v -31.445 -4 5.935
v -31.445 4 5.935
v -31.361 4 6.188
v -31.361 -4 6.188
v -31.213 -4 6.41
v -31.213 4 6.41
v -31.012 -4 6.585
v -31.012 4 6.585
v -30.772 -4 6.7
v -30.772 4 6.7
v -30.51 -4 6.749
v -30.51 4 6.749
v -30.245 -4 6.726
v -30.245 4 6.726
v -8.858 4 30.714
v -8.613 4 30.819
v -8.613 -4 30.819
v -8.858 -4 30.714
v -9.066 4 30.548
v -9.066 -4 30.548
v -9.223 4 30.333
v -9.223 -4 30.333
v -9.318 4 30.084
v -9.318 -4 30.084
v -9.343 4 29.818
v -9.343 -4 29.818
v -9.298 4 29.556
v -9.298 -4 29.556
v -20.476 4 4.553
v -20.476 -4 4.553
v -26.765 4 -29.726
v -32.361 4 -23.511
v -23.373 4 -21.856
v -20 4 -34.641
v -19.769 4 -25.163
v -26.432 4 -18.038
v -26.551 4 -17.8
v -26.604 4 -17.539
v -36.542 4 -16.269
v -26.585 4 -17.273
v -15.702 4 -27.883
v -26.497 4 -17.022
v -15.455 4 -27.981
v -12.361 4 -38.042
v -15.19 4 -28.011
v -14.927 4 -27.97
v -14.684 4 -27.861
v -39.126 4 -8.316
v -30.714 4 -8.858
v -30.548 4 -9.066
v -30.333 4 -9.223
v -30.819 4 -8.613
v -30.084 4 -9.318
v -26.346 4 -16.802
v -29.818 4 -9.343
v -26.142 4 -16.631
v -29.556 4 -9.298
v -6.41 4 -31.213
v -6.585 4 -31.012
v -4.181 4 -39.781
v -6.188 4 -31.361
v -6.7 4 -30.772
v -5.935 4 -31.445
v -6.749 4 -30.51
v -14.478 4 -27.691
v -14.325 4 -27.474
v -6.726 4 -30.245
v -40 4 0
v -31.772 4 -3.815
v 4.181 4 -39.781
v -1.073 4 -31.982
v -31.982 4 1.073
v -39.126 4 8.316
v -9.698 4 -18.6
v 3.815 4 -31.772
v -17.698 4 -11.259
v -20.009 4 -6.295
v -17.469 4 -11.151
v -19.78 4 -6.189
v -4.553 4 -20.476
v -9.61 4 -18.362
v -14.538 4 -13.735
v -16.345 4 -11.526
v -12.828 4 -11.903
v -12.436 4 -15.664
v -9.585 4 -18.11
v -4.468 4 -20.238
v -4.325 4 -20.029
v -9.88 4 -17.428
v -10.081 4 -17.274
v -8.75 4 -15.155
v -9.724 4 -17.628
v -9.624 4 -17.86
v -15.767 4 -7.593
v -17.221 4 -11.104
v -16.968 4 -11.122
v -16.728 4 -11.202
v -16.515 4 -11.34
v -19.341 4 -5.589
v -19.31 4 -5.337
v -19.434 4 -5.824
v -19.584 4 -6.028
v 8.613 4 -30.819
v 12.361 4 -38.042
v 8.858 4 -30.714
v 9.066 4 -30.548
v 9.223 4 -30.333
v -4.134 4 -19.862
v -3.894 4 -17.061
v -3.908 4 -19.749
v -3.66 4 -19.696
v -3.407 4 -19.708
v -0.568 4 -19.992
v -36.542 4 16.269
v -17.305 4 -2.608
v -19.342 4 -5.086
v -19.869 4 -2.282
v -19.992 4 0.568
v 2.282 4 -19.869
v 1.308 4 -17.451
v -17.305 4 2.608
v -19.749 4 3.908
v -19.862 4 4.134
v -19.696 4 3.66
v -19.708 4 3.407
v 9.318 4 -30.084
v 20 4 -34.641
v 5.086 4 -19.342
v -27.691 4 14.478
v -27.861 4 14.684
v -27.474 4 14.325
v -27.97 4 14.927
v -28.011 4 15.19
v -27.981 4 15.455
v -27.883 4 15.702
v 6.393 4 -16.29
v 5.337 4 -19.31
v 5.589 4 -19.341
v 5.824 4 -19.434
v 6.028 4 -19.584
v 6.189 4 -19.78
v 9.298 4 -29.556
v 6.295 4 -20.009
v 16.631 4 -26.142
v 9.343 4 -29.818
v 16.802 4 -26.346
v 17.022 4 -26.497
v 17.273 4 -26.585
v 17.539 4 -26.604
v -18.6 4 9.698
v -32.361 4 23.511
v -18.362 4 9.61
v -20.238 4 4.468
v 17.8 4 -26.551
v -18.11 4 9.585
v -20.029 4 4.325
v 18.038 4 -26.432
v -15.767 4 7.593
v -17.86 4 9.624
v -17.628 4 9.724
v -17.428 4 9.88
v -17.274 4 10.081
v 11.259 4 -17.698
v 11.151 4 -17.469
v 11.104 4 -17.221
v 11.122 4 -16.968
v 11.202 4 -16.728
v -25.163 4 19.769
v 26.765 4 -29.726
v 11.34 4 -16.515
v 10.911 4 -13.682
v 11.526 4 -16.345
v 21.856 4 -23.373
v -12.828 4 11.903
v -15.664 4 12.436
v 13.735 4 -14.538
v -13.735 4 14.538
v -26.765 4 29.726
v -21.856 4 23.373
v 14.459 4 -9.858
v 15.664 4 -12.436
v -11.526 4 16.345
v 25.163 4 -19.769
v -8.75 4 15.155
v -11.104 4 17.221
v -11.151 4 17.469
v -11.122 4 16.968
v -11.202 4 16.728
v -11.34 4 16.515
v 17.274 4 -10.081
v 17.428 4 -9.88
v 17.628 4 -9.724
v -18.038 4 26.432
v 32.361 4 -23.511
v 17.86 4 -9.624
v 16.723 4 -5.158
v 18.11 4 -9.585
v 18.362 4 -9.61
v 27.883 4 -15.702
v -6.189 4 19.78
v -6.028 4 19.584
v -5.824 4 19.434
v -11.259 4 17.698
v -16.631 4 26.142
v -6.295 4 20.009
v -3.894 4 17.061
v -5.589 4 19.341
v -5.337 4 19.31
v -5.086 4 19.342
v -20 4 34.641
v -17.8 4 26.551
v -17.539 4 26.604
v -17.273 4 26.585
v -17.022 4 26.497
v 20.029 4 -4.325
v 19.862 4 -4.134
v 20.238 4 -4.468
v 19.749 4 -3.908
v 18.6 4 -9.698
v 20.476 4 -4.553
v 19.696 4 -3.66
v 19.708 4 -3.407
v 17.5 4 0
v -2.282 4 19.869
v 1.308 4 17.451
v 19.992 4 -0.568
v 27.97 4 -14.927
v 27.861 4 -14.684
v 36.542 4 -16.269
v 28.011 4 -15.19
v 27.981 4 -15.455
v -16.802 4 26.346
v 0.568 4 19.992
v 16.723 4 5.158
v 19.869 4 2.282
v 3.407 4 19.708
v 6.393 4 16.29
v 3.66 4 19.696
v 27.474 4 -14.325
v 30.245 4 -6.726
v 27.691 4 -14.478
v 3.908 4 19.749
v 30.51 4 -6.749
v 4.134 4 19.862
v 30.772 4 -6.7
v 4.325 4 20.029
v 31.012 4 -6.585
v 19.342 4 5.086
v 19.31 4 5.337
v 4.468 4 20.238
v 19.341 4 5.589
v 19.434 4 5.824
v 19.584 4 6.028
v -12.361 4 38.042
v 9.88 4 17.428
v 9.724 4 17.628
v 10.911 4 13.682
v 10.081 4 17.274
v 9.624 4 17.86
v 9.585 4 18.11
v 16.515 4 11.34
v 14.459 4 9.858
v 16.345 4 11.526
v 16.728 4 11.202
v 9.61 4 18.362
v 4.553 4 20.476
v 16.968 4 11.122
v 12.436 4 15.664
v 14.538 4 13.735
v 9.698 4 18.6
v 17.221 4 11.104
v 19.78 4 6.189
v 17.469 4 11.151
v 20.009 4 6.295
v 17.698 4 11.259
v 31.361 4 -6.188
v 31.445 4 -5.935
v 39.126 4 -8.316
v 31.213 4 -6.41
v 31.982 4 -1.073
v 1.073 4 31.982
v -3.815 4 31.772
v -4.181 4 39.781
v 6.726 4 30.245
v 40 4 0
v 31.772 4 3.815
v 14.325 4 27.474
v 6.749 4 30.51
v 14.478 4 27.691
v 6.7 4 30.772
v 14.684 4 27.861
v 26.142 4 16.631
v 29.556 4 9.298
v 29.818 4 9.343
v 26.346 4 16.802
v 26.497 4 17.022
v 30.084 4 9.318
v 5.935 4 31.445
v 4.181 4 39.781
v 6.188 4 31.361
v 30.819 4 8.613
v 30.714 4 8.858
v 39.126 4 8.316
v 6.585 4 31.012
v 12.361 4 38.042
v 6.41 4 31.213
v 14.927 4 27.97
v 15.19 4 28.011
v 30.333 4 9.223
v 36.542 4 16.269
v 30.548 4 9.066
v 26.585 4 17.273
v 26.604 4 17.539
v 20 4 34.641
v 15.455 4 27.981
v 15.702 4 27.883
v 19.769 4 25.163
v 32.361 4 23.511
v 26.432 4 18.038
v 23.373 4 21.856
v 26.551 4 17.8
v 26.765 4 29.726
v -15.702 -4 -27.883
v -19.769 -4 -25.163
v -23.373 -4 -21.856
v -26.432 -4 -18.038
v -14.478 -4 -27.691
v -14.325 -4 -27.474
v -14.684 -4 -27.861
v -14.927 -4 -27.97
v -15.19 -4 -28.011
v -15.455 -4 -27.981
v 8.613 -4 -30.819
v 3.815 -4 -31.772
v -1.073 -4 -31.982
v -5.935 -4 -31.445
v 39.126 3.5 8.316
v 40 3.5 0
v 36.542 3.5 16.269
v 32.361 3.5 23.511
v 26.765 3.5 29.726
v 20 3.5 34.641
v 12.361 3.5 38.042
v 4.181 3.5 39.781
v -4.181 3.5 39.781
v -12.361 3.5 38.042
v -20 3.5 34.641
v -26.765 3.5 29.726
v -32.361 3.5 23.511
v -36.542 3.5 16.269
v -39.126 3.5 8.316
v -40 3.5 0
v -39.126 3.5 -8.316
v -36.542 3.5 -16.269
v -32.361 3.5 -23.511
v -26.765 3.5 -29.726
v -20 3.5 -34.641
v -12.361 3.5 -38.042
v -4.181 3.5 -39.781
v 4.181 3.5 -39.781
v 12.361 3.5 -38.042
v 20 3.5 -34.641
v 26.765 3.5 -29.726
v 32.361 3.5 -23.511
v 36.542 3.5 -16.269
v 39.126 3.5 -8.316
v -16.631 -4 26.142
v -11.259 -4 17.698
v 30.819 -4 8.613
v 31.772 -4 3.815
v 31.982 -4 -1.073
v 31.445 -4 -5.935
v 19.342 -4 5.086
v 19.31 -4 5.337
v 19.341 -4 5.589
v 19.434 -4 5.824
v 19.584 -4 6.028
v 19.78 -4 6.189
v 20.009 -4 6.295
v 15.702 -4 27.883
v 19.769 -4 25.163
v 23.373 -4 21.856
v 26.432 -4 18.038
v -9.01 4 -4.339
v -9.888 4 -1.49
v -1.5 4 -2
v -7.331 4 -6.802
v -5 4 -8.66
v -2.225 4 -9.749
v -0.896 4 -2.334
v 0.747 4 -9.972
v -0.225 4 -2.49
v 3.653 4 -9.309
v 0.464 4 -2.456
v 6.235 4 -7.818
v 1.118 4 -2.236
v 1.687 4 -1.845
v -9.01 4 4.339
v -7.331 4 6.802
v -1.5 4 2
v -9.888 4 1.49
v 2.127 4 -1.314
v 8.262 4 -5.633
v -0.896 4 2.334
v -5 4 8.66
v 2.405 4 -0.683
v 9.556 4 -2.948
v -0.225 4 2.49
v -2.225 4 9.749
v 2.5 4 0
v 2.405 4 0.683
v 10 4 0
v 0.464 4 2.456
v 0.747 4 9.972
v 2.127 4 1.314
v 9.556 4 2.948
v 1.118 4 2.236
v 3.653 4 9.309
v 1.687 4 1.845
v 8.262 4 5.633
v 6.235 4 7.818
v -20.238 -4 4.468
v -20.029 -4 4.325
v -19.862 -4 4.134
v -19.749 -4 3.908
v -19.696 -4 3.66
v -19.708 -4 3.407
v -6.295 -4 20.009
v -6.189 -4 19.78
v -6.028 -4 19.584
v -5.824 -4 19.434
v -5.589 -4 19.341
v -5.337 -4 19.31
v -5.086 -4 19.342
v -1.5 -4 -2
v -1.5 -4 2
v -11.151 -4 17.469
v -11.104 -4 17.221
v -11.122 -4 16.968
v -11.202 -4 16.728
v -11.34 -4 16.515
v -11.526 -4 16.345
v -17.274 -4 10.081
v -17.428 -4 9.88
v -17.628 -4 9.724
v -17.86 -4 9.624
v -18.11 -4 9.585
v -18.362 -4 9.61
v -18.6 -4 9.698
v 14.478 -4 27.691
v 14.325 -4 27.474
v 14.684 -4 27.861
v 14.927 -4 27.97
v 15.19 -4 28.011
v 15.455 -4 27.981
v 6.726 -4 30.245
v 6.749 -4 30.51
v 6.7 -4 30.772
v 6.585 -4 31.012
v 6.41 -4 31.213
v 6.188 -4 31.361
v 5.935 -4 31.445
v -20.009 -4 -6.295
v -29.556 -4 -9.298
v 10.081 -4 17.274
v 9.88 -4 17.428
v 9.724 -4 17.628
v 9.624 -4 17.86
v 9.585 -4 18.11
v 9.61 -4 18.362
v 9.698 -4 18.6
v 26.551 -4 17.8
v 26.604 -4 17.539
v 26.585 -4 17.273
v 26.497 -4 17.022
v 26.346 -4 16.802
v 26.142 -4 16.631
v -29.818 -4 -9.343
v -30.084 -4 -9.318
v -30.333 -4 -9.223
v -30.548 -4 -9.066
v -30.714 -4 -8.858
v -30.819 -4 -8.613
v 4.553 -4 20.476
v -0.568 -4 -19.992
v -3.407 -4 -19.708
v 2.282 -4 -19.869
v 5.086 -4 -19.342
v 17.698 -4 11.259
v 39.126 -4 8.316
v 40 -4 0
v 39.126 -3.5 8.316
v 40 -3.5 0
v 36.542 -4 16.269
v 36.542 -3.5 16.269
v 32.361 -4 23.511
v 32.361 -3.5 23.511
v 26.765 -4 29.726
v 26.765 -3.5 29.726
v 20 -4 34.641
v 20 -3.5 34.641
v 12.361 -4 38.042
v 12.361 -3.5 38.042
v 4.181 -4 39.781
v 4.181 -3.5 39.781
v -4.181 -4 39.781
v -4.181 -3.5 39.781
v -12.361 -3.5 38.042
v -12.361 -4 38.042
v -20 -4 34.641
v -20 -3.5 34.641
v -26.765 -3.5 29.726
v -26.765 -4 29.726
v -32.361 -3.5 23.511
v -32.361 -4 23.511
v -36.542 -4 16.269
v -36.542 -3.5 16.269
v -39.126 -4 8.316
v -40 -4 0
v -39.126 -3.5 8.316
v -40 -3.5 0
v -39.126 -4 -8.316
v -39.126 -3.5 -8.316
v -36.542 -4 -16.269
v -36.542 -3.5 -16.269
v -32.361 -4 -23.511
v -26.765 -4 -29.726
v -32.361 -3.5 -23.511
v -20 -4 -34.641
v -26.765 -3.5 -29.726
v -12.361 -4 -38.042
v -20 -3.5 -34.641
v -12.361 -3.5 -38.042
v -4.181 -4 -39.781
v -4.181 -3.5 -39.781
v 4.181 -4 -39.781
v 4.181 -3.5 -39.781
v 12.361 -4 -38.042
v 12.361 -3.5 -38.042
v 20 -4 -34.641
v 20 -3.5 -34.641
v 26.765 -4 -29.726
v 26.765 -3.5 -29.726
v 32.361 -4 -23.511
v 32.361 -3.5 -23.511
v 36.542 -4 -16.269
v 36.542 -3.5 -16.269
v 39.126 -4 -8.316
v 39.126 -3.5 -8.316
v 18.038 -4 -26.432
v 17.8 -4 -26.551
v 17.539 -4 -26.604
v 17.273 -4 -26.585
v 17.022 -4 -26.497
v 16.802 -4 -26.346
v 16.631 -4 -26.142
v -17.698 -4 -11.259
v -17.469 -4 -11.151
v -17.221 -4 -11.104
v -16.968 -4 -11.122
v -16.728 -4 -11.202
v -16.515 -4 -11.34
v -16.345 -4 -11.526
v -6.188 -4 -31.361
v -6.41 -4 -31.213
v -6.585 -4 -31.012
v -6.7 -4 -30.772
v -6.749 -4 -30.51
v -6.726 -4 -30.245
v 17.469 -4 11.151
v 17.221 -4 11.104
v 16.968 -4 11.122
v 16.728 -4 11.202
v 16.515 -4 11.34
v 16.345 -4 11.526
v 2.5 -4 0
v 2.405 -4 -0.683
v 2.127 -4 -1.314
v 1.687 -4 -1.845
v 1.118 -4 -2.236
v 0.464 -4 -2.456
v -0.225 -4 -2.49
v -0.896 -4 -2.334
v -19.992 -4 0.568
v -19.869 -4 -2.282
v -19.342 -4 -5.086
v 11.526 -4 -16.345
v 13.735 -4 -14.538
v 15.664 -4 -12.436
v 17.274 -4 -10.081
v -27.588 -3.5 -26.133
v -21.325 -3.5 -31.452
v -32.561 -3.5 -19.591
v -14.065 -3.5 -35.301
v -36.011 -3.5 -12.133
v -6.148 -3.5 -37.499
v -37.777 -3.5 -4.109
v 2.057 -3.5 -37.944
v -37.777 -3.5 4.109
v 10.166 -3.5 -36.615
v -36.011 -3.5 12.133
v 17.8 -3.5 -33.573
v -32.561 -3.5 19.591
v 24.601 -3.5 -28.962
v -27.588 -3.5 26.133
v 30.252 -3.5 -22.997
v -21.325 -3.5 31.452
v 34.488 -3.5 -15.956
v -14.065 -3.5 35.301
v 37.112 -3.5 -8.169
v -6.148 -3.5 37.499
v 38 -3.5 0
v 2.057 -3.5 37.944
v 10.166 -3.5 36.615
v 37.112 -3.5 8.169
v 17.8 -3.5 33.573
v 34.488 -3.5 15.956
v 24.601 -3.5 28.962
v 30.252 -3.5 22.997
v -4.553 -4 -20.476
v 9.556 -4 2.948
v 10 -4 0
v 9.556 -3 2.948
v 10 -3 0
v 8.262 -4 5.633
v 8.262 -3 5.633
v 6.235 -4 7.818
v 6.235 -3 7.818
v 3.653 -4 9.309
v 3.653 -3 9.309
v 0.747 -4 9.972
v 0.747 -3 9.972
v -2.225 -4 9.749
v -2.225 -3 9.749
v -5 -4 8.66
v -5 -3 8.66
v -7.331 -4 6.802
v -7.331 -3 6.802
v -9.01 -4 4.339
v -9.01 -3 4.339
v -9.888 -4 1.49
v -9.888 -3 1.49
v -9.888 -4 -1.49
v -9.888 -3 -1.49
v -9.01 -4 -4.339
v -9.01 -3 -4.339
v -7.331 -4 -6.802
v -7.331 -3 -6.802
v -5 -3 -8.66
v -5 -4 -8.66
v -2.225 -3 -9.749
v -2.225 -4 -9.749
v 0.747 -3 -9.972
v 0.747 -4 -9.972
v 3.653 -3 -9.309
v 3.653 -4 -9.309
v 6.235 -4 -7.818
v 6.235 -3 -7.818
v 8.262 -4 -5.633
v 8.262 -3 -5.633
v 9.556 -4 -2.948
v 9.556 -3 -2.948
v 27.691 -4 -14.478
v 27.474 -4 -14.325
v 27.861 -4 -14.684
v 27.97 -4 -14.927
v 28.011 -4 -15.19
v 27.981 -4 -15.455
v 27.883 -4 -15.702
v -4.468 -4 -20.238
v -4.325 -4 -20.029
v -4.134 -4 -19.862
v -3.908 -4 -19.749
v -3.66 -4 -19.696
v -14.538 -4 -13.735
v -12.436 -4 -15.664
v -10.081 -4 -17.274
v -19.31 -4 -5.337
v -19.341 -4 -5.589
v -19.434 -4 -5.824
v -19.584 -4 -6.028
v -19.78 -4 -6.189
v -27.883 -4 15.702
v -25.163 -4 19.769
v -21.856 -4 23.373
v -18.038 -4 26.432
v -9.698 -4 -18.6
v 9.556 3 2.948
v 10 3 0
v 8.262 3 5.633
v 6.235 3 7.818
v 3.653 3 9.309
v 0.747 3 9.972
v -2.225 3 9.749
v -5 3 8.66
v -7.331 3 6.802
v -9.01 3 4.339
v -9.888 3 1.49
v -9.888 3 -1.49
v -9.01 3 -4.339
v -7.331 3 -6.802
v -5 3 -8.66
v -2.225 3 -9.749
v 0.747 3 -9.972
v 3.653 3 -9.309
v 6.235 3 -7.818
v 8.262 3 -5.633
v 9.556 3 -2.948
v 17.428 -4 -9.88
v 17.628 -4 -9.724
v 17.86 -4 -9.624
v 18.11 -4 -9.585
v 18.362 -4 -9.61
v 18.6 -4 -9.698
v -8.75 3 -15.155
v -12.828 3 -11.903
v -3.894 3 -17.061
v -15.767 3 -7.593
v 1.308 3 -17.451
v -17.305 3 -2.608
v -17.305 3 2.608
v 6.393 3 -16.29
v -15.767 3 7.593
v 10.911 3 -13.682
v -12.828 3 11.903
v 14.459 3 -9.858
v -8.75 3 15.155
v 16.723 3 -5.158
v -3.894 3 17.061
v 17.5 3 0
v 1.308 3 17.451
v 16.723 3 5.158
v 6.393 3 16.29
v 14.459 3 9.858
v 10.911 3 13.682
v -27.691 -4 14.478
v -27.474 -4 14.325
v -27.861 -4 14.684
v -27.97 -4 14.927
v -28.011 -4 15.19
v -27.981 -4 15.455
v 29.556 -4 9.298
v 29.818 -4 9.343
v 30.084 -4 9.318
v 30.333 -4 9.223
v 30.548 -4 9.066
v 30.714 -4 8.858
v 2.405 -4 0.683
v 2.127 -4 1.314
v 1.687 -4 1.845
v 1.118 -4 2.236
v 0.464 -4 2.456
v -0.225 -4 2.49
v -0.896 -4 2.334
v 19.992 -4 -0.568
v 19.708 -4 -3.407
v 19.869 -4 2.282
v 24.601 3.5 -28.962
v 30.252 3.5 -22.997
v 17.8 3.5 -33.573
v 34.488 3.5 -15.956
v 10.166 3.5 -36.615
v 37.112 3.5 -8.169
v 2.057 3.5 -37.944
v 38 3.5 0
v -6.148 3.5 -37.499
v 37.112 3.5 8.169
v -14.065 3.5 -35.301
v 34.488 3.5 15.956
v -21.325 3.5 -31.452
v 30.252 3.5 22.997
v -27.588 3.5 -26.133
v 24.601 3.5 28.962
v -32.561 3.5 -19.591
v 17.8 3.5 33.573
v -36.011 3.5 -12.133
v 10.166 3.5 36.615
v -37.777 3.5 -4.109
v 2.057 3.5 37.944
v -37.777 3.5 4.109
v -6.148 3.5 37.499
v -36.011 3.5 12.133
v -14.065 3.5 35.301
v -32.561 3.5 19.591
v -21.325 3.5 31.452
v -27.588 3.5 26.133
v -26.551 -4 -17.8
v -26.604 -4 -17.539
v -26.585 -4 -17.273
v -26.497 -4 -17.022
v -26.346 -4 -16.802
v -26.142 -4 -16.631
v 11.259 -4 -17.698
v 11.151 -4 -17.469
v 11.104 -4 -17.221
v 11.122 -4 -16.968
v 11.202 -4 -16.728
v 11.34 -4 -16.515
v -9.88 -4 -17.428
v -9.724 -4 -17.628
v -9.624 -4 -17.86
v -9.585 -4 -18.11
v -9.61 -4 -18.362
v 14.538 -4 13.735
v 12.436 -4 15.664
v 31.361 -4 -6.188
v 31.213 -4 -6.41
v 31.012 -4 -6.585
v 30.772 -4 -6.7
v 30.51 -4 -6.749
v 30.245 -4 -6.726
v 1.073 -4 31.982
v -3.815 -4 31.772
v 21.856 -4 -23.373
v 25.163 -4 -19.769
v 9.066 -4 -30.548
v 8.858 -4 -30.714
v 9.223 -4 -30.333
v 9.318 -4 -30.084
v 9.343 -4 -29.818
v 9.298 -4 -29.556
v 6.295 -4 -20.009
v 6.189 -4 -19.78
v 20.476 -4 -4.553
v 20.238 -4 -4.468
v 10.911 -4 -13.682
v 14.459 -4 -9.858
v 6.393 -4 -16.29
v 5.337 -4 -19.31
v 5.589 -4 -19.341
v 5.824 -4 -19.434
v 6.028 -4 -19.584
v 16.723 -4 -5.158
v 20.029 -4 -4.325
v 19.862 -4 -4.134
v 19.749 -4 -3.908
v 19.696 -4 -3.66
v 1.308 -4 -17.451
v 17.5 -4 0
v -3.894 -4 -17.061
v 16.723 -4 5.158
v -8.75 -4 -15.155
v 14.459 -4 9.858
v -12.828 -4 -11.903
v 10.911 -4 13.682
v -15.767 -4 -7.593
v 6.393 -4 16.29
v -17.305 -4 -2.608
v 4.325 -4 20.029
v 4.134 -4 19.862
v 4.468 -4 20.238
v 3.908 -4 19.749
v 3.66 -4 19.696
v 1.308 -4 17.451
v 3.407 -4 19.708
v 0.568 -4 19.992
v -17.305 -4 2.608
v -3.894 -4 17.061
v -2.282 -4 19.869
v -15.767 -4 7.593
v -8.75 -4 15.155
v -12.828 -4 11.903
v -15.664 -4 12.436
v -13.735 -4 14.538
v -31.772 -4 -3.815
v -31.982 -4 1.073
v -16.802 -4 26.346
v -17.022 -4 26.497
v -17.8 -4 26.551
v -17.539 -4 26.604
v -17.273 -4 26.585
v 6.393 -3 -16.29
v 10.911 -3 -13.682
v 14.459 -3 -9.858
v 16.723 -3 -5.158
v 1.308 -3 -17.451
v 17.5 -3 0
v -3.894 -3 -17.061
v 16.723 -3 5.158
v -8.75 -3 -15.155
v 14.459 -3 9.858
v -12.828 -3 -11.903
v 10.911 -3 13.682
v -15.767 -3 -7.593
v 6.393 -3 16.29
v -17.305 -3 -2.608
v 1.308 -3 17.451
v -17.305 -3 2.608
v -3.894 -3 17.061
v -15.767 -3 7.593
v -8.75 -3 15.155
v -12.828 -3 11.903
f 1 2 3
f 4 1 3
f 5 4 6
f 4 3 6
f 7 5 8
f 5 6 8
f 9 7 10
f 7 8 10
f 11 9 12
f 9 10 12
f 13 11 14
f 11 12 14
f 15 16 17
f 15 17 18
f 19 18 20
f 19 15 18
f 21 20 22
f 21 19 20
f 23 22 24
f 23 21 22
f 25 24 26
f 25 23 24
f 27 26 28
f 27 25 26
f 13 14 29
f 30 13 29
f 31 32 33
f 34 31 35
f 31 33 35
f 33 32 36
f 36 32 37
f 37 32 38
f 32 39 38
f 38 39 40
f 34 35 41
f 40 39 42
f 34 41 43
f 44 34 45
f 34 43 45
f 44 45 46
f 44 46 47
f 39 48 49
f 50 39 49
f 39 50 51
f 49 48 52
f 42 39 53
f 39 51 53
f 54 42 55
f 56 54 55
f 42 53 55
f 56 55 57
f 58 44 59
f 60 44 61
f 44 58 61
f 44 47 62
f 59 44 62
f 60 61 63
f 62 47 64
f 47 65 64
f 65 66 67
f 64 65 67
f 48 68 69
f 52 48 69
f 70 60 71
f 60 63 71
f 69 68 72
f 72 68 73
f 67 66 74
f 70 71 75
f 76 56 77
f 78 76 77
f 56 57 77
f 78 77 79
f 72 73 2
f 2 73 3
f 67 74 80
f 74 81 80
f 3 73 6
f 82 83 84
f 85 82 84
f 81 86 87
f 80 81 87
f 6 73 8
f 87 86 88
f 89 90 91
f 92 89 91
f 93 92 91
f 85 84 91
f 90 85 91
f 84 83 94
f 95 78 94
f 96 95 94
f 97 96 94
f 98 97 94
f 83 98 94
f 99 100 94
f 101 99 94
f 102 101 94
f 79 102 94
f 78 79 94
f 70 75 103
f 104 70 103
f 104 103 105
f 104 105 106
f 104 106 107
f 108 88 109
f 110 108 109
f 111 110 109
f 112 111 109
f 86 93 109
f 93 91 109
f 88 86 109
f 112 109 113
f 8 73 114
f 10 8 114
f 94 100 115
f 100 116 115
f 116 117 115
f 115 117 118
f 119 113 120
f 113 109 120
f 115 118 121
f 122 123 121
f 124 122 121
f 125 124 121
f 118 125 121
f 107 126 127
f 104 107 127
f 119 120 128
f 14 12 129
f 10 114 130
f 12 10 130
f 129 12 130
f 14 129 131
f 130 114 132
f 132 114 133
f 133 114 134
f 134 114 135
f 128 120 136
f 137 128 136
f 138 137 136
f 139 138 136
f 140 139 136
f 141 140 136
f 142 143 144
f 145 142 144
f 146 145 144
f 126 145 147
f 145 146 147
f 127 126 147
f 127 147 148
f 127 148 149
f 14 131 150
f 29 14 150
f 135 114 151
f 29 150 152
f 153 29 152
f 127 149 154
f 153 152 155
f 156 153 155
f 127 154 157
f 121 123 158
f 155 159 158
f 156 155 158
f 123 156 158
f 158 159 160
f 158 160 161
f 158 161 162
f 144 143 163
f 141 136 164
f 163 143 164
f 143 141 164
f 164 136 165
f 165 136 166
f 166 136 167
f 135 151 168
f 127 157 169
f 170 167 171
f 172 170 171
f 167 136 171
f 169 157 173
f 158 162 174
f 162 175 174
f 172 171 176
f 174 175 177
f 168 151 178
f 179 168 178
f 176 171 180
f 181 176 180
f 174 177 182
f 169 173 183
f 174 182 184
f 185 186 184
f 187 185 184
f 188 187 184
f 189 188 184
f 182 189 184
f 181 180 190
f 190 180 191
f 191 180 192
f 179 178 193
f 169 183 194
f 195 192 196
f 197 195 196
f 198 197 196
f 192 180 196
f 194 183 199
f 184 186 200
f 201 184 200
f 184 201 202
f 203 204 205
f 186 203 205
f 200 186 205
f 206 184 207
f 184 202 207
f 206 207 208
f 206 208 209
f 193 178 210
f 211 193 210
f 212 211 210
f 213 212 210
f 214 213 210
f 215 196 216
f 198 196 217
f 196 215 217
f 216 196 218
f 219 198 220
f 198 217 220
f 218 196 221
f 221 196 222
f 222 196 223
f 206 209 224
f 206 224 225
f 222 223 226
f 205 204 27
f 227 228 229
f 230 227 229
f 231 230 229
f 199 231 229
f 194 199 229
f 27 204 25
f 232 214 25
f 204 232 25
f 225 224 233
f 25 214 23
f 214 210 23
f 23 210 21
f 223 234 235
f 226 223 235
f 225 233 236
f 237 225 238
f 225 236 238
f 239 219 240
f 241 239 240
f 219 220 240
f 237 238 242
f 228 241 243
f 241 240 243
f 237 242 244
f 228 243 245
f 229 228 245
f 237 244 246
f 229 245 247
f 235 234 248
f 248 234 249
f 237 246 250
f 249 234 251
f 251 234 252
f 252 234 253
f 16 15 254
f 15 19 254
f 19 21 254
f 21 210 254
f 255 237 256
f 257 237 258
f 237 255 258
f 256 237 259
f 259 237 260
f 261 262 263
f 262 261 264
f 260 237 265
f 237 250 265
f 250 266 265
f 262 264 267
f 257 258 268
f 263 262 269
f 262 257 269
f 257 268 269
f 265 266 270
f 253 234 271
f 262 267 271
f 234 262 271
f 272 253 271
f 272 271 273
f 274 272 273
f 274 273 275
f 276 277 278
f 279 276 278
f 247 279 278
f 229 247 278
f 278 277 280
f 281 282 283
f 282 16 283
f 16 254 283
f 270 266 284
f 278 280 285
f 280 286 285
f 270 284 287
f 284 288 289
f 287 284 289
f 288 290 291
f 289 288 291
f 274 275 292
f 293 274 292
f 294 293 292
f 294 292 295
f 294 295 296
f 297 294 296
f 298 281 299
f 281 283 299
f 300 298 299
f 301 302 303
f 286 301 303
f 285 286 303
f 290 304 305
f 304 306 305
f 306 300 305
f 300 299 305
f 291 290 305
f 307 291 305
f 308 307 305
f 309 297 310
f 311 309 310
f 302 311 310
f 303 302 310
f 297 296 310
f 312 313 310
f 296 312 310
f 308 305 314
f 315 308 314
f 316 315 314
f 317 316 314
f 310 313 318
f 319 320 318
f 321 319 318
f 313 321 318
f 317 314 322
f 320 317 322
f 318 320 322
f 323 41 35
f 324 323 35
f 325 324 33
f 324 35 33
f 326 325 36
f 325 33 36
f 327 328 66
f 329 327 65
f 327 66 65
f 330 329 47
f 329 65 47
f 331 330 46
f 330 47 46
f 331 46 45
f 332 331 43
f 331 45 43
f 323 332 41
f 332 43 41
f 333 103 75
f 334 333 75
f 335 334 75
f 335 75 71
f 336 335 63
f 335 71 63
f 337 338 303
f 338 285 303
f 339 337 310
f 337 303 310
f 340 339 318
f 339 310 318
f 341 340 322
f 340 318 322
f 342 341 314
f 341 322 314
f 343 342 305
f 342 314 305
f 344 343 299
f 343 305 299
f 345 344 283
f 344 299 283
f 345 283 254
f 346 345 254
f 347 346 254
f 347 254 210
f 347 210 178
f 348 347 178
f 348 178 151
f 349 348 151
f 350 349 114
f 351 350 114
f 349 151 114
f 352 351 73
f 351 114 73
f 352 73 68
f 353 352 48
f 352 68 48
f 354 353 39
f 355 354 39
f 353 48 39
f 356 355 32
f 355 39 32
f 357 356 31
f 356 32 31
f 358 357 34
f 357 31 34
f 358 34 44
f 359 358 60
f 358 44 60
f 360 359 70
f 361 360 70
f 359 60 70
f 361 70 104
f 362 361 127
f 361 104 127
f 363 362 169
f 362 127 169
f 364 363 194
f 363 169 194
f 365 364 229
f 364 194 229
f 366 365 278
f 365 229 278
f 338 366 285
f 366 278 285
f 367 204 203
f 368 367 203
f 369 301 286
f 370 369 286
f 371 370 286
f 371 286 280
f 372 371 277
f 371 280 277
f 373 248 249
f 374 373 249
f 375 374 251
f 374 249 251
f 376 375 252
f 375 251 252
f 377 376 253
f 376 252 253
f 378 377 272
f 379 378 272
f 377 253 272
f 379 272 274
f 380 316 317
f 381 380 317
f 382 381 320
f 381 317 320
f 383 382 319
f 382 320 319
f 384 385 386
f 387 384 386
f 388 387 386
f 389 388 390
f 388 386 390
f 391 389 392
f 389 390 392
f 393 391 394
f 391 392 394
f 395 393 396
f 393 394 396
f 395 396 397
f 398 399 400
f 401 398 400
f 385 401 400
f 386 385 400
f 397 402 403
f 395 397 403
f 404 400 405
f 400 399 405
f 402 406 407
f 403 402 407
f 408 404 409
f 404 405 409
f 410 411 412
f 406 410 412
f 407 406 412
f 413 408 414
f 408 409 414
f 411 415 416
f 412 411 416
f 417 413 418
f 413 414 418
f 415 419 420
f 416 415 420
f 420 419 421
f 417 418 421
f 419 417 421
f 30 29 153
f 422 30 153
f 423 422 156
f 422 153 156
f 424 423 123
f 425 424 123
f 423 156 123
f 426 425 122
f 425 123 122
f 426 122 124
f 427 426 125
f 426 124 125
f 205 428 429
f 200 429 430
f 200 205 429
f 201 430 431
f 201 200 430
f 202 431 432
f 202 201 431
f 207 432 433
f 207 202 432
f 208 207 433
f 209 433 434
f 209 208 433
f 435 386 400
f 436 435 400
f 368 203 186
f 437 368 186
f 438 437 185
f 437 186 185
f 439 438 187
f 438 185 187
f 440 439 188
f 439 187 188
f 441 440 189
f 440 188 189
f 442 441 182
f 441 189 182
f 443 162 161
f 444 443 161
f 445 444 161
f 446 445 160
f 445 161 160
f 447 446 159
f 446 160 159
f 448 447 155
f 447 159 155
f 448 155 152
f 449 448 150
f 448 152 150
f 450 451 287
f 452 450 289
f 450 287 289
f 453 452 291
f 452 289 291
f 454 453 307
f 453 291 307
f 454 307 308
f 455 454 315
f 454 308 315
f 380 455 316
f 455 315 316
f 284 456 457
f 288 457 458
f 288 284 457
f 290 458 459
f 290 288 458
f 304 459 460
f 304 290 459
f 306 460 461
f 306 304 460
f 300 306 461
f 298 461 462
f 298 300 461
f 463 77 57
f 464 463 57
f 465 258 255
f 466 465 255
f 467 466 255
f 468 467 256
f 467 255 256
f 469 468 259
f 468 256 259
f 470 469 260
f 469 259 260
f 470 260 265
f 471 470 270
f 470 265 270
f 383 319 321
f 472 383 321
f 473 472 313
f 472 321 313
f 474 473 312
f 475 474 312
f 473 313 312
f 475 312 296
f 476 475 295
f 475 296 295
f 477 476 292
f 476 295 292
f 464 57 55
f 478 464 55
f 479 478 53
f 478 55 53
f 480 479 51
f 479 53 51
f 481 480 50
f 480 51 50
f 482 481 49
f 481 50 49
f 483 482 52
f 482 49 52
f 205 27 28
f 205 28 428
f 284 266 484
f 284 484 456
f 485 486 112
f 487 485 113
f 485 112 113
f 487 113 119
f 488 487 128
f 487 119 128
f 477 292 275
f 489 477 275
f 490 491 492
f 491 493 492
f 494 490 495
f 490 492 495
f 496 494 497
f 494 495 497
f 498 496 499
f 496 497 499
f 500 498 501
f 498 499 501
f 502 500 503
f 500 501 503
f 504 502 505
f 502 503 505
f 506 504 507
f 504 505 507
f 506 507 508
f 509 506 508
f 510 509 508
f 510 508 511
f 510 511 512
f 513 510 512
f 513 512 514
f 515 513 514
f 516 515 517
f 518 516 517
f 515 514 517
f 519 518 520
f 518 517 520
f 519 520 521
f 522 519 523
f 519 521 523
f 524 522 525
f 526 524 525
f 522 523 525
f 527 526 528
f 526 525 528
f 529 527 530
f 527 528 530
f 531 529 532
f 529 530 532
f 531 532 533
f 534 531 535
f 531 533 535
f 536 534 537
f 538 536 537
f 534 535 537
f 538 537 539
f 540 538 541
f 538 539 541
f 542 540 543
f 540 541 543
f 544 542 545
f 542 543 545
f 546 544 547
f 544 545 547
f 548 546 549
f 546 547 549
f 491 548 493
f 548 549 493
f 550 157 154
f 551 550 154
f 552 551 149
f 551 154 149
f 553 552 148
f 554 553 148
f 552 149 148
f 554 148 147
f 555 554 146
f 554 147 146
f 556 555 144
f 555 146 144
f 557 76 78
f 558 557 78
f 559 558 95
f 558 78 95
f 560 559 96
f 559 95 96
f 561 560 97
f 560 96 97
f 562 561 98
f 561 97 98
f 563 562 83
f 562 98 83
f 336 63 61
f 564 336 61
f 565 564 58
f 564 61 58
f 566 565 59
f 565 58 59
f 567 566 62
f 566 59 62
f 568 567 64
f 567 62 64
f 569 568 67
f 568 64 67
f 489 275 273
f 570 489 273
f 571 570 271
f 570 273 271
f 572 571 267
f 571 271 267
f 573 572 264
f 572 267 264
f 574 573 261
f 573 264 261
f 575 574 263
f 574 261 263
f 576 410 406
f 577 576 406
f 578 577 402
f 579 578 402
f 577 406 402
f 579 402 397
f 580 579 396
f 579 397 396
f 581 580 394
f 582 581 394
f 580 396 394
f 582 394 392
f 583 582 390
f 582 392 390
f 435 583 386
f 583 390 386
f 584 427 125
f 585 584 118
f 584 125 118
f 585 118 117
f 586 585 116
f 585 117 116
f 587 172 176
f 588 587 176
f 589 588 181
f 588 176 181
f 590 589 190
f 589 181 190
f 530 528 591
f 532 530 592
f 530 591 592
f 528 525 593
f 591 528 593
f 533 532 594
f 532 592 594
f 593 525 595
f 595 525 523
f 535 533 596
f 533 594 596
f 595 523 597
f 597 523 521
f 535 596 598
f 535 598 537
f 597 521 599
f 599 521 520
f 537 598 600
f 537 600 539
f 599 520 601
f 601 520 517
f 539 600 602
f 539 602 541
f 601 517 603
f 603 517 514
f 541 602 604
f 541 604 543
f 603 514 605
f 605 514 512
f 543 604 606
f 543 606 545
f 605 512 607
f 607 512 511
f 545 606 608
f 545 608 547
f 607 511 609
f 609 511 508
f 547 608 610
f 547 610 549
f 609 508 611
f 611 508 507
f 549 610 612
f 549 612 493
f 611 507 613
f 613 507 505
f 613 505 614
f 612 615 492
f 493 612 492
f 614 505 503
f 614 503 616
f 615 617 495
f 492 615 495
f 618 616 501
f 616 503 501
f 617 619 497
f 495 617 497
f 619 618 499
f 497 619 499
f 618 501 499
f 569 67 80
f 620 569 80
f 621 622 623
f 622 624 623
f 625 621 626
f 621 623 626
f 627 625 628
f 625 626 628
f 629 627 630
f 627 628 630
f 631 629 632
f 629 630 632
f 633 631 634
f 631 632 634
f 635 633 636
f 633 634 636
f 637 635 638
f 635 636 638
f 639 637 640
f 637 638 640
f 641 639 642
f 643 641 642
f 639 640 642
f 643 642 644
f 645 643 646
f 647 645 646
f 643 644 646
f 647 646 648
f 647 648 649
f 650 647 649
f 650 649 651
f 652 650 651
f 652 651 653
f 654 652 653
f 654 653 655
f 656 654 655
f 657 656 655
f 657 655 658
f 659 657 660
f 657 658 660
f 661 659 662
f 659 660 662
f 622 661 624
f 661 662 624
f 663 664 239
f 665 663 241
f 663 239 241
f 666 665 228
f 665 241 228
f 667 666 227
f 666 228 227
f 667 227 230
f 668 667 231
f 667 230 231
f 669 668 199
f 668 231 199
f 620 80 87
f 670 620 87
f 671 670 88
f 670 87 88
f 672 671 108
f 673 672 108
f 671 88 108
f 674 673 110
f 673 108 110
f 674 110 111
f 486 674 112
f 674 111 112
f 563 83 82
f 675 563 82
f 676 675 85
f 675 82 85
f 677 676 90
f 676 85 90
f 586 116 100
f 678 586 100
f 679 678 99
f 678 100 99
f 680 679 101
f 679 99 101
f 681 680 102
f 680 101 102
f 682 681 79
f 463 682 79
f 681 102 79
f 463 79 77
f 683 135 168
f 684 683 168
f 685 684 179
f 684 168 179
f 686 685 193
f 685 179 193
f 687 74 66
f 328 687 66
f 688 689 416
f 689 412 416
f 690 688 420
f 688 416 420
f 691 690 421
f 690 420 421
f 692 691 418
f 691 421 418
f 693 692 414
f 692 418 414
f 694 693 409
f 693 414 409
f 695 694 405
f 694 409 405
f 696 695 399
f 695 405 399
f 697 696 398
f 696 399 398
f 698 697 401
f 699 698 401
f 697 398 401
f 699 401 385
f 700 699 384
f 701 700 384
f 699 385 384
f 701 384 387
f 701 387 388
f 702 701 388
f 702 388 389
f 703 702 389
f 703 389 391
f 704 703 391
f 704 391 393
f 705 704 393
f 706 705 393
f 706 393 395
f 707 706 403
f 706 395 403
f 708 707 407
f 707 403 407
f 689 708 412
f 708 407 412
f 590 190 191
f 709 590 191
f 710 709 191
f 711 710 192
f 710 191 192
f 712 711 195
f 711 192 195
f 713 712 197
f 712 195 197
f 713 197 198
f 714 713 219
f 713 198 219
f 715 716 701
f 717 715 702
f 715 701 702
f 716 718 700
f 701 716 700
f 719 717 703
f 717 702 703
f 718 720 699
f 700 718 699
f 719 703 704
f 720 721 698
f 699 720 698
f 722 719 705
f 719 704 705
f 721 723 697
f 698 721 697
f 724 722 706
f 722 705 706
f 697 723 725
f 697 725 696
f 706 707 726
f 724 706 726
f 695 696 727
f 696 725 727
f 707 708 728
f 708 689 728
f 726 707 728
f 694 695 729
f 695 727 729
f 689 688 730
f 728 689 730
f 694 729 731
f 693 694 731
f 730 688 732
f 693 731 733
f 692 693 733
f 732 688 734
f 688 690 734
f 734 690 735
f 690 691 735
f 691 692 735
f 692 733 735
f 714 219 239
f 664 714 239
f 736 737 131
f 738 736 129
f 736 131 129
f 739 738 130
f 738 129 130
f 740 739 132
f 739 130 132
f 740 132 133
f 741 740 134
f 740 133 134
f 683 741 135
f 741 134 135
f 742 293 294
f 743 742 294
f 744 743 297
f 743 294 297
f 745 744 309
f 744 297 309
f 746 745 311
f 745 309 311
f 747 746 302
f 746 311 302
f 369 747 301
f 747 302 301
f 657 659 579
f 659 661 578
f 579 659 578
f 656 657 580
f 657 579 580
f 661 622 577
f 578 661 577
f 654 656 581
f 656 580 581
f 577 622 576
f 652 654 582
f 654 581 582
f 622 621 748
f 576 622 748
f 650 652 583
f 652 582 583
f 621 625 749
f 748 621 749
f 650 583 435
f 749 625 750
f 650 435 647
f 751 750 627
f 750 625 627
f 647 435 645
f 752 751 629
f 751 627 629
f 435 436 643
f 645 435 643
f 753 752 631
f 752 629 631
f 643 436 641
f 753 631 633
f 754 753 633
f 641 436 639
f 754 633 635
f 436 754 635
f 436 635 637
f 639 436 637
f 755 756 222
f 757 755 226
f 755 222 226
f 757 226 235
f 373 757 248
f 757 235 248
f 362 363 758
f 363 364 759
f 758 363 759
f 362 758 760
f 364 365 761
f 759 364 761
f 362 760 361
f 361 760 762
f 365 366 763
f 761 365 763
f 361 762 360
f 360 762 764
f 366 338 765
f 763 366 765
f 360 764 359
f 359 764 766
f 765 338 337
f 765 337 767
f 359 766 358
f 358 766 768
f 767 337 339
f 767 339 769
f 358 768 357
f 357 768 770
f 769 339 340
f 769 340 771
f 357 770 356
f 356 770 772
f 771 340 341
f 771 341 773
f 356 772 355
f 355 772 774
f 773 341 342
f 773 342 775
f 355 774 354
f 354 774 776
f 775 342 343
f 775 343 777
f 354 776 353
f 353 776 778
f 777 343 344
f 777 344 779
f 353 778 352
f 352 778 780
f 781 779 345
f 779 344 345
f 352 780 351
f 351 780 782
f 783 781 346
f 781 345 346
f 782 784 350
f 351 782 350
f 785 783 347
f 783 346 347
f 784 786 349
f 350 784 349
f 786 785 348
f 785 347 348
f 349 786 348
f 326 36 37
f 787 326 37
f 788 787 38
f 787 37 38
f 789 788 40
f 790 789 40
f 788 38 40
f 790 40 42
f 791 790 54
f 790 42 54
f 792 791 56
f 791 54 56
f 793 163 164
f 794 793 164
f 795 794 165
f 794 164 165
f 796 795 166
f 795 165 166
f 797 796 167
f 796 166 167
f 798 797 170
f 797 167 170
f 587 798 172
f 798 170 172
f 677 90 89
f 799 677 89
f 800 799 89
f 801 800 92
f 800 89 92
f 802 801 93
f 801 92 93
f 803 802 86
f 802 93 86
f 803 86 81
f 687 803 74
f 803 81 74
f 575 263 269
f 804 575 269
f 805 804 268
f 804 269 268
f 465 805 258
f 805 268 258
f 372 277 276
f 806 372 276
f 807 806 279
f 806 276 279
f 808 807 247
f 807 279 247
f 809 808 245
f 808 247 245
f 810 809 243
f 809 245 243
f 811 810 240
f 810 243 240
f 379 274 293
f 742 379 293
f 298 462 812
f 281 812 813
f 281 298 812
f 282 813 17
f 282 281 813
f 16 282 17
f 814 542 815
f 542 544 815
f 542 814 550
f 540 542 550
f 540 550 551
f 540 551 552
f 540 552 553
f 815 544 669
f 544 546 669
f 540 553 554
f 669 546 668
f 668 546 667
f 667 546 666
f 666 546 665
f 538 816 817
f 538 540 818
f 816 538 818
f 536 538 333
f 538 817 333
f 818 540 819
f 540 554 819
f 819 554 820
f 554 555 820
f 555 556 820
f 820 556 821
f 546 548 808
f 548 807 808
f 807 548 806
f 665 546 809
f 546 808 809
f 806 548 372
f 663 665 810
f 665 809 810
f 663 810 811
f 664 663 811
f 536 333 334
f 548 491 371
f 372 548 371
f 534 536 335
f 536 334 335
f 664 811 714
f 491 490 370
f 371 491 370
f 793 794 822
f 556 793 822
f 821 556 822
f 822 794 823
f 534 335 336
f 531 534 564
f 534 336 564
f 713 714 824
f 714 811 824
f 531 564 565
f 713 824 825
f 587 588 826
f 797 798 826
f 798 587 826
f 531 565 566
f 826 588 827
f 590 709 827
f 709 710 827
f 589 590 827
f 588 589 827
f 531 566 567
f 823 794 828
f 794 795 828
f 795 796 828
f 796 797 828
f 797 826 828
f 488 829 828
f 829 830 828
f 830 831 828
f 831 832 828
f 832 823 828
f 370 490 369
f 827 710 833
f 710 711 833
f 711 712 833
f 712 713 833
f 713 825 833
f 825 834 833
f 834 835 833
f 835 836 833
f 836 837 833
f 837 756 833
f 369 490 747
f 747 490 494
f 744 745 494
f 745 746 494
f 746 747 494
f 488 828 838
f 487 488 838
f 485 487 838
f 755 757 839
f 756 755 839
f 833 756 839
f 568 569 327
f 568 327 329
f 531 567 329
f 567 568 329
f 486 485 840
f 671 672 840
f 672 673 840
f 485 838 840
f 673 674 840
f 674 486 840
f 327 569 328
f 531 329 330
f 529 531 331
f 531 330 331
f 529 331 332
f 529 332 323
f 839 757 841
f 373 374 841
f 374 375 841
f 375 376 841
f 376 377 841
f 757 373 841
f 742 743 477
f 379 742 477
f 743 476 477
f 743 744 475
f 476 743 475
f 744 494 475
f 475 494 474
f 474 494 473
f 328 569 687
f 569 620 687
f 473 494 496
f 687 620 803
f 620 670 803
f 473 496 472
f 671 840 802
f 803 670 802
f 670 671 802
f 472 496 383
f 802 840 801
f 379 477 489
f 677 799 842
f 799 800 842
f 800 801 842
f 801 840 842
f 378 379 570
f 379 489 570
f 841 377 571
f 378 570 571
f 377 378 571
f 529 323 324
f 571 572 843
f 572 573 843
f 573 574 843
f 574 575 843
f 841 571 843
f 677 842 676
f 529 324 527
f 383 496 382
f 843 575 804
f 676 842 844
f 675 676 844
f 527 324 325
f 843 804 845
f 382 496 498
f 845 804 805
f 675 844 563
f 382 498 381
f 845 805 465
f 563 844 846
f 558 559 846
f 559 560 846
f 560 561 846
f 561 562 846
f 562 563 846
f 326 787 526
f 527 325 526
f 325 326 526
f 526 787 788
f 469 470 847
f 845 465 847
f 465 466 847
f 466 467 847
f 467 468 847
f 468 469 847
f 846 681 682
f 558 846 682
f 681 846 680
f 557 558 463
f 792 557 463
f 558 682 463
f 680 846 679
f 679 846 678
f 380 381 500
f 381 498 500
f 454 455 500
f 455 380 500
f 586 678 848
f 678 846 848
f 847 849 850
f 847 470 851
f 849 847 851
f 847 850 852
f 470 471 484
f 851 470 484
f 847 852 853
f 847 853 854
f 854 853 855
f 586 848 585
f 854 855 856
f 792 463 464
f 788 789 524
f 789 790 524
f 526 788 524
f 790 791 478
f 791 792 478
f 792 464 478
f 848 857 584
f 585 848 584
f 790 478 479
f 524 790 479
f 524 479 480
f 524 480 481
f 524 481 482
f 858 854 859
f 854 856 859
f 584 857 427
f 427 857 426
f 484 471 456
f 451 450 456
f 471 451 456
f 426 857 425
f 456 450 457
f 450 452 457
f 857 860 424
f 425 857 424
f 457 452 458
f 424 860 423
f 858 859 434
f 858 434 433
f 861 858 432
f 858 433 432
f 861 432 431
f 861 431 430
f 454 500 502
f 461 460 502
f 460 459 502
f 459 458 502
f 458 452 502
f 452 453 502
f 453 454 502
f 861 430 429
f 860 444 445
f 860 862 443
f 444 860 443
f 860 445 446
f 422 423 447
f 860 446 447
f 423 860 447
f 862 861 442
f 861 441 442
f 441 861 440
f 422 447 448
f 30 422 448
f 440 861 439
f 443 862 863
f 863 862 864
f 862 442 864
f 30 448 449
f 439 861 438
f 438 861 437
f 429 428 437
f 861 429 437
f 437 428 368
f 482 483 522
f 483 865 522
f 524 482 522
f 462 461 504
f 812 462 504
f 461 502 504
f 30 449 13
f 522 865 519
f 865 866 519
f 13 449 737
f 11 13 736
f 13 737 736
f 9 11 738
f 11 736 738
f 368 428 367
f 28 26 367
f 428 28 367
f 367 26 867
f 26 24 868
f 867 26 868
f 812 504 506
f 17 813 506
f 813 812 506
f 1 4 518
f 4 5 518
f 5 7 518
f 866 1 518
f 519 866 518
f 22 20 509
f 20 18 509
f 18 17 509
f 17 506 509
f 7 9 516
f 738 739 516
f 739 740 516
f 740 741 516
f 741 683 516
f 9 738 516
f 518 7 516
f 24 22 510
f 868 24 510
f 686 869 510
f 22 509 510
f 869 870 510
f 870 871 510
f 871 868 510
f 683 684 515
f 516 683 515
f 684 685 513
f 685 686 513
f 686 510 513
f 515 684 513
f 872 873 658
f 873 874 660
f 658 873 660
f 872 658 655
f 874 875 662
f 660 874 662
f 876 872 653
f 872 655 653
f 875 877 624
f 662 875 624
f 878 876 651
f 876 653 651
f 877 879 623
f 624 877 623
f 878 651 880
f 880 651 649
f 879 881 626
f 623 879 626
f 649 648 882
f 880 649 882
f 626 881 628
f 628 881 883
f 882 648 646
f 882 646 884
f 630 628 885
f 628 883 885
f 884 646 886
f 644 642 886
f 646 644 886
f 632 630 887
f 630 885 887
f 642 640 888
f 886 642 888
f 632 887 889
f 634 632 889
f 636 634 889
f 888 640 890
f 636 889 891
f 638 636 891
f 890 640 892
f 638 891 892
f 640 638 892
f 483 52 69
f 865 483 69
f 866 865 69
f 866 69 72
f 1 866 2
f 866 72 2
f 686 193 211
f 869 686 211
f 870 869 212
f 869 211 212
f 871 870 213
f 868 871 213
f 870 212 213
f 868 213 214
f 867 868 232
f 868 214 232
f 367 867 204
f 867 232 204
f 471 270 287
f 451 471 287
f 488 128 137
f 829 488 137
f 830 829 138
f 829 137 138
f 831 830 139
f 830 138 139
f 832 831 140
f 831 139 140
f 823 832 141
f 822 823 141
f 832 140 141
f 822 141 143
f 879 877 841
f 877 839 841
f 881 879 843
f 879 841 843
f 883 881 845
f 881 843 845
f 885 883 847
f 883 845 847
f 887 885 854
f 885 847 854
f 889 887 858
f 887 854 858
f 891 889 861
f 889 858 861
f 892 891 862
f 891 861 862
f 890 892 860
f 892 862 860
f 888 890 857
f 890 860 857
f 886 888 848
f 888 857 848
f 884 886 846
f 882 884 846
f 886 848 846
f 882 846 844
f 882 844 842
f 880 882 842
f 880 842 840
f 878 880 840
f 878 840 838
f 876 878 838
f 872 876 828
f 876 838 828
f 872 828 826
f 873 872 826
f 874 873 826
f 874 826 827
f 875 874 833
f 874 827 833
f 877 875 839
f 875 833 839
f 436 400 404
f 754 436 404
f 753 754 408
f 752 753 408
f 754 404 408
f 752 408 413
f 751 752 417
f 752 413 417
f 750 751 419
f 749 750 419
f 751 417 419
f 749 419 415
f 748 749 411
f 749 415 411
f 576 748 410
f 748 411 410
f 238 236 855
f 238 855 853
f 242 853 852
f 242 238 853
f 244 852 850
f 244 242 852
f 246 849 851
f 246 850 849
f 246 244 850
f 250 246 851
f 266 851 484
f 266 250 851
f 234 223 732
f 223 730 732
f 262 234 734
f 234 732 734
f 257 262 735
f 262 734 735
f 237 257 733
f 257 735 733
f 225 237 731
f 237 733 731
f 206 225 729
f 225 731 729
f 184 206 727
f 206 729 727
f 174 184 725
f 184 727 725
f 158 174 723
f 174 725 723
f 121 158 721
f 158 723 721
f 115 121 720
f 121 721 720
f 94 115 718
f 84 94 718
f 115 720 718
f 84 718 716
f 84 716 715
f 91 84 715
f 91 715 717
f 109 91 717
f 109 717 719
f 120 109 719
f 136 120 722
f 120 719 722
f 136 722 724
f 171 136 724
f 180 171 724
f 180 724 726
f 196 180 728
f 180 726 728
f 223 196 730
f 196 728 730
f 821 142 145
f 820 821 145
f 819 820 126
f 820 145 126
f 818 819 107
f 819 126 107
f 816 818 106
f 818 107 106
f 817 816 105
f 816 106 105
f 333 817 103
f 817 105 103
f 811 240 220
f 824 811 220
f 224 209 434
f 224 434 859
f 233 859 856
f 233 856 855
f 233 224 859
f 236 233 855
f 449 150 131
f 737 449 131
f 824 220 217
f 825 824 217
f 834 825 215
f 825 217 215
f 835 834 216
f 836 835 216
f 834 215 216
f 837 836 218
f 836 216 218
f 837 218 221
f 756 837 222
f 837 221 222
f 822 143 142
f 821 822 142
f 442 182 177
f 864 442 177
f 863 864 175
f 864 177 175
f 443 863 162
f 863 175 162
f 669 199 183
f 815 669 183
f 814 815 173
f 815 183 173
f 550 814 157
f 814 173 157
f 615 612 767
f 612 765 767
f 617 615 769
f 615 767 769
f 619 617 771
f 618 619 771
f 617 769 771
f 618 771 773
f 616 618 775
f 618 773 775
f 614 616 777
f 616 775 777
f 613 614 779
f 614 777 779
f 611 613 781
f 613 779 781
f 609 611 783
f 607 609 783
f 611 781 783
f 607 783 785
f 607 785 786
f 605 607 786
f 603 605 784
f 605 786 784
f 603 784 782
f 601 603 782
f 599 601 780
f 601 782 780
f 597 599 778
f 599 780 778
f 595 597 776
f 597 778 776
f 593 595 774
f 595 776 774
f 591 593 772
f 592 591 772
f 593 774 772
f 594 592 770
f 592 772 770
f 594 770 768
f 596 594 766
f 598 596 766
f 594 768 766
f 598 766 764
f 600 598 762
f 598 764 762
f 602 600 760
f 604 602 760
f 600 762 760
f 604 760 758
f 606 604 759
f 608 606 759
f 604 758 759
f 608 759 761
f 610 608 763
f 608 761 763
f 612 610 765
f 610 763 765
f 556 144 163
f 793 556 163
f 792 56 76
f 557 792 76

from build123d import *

# Parameters (mm, degrees)
CUT_EXTRUDE1_REACH = 10
CUT_EXTRUDE2_REACH = 10


with BuildPart() as part:
    # Sketch1 → Revolve3 (revolve)
    with BuildSketch(Plane.XY):
        Polygon((40, 4), (37, 4), (17.5, 4), (17.5, 3), (10, 3), (10, 4), (0, 4), (0, -4), (10, -4), (10, -3), (17.5, -3), (17.5, -4), (37, -4), (40, -4), (40, -3.5), (38, -3.5), (38, 3.5), (40, 3.5), align=None)
    revolve(axis=Axis((0, 4, 0), (0, -1, 0)))

    # Sketch2 → Cut-Extrude1 (cut, up to next)
    with BuildSketch(Plane(origin=(0, 4, 0), x_dir=(1, 0, 0), z_dir=(0, 1, 0)), mode=Mode.PRIVATE) as cut_extrude1_sk1:
        with BuildLine():
            ThreePointArc((2.5, 0), (1.118033989, 2.236067977), (-1.5, 2))
            Line((-1.5, 2), (-1.5, -2))
            ThreePointArc((-1.5, -2), (1.118033989, -2.236067977), (2.5, 0))
        make_face()
    cut_extrude1_tool1 = extrude(cut_extrude1_sk1.sketch, amount=-CUT_EXTRUDE1_REACH, mode=Mode.PRIVATE) & part.part
    add(cut_extrude1_tool1.solids().sort_by_distance((0.316718, 4, 0))[0], mode=Mode.SUBTRACT)

    # Sketch3 → Cut-Extrude2 (cut, up to next)
    with BuildSketch(Plane(origin=(0, 4, 0), x_dir=(1, 0, 0), z_dir=(0, 1, 0)), mode=Mode.PRIVATE) as cut_extrude2_sk1:
        with BuildLine():
            Line((4.553448892, -20.475988454), (6.725889759, -30.245039378))
            ThreePointArc((6.725889759, -30.245039378), (6.584709324, -31.012405912), (5.935210643, -31.444765457))
            ThreePointArc((5.935210643, -31.444765457), (-1.374941712, -31.970447843), (-8.612970493, -30.81909699))
            ThreePointArc((-8.612970493, -30.81909699), (-9.22295101, -30.33257147), (-9.297728295, -29.555917319))
            Line((-9.297728295, -29.555917319), (-6.294591812, -20.009450615))
            ThreePointArc((-6.294591812, -20.009450615), (-5.823993451, -19.434086857), (-5.08636065, -19.342412862))
            ThreePointArc((-5.08636065, -19.342412862), (-0.85933857, -19.981529902), (3.406947089, -19.707681536))
            ThreePointArc((3.406947089, -19.707681536), (4.133985694, -19.862346135), (4.553448892, -20.475988454))
        make_face()
    cut_extrude2_tool1 = extrude(cut_extrude2_sk1.sketch, amount=-CUT_EXTRUDE2_REACH, mode=Mode.PRIVATE) & part.part
    add(cut_extrude2_tool1.solids().sort_by_distance((-1.124173, 4, 26.139518))[0], mode=Mode.SUBTRACT)
    # Sketch3 → Cut-Extrude2 (cut, up to next)
    with BuildSketch(Plane(origin=(0, 4, 0), x_dir=(1, 0, 0), z_dir=(0, 1, 0)), mode=Mode.PRIVATE) as cut_extrude2_sk2:
        with BuildLine():
            Line((-18.599766773, -9.697869663), (-27.473676287, -14.324702834))
            ThreePointArc((-27.473676287, -14.324702834), (-27.969978179, -14.926755776), (-27.882682314, -15.70210263))
            ThreePointArc((-27.882682314, -15.70210263), (-23.578751076, -21.634289859), (-18.037979194, -26.431634581))
            ThreePointArc((-18.037979194, -26.431634581), (-17.272989906, -26.585175136), (-16.630550183, -26.142394699))
            Line((-16.630550183, -26.142394699), (-11.258935698, -17.698484877))
            ThreePointArc((-11.258935698, -17.698484877), (-11.121630324, -16.96796896), (-11.526359866, -16.344510646))
            ThreePointArc((-11.526359866, -16.344510646), (-14.736719422, -13.521431162), (-17.273751407, -10.080551193))
            ThreePointArc((-17.273751407, -10.080551193), (-17.860159866, -9.62378934), (-18.599766773, -9.697869663))
        make_face()
    cut_extrude2_tool2 = extrude(cut_extrude2_sk2.sketch, amount=-CUT_EXTRUDE2_REACH, mode=Mode.PRIVATE) & part.part
    add(cut_extrude2_tool2.solids().sort_by_distance((-19.278341, 4, 17.68852))[0], mode=Mode.SUBTRACT)
    # Sketch3 → Cut-Extrude2 (cut, up to next)
    with BuildSketch(Plane(origin=(0, 4, 0), x_dir=(1, 0, 0), z_dir=(0, 1, 0)), mode=Mode.PRIVATE) as cut_extrude2_sk3:
        with BuildLine():
            Line((-20.009450615, 6.294591812), (-29.555917319, 9.297728295))
            ThreePointArc((-29.555917319, 9.297728295), (-30.33257147, 9.22295101), (-30.81909699, 8.612970493))
            ThreePointArc((-30.81909699, 8.612970493), (-31.970447843, 1.374941712), (-31.444765457, -5.935210643))
            ThreePointArc((-31.444765457, -5.935210643), (-31.012405912, -6.584709324), (-30.245039378, -6.725889759))
            Line((-30.245039378, -6.725889759), (-20.475988454, -4.553448892))
            ThreePointArc((-20.475988454, -4.553448892), (-19.862346135, -4.133985694), (-19.707681536, -3.406947089))
            ThreePointArc((-19.707681536, -3.406947089), (-19.981529902, 0.85933857), (-19.342412862, 5.08636065))
            ThreePointArc((-19.342412862, 5.08636065), (-19.434086857, 5.823993451), (-20.009450615, 6.294591812))
        make_face()
    cut_extrude2_tool3 = extrude(cut_extrude2_sk3.sketch, amount=-CUT_EXTRUDE2_REACH, mode=Mode.PRIVATE) & part.part
    add(cut_extrude2_tool3.solids().sort_by_distance((-26.139518, 4, -1.124173))[0], mode=Mode.SUBTRACT)
    # Sketch3 → Cut-Extrude2 (cut, up to next)
    with BuildSketch(Plane(origin=(0, 4, 0), x_dir=(1, 0, 0), z_dir=(0, 1, 0)), mode=Mode.PRIVATE) as cut_extrude2_sk4:
        with BuildLine():
            Line((-9.697869663, 18.599766773), (-14.324702834, 27.473676287))
            ThreePointArc((-14.324702834, 27.473676287), (-14.926755776, 27.969978179), (-15.70210263, 27.882682314))
            ThreePointArc((-15.70210263, 27.882682314), (-21.634289859, 23.578751076), (-26.431634581, 18.037979194))
            ThreePointArc((-26.431634581, 18.037979194), (-26.585175136, 17.272989906), (-26.142394699, 16.630550183))
            Line((-26.142394699, 16.630550183), (-17.698484877, 11.258935698))
            ThreePointArc((-17.698484877, 11.258935698), (-16.96796896, 11.121630324), (-16.344510646, 11.526359866))
            ThreePointArc((-16.344510646, 11.526359866), (-13.521431162, 14.736719422), (-10.080551193, 17.273751407))
            ThreePointArc((-10.080551193, 17.273751407), (-9.62378934, 17.860159866), (-9.697869663, 18.599766773))
        make_face()
    cut_extrude2_tool4 = extrude(cut_extrude2_sk4.sketch, amount=-CUT_EXTRUDE2_REACH, mode=Mode.PRIVATE) & part.part
    add(cut_extrude2_tool4.solids().sort_by_distance((-17.68852, 4, -19.278341))[0], mode=Mode.SUBTRACT)
    # Sketch3 → Cut-Extrude2 (cut, up to next)
    with BuildSketch(Plane(origin=(0, 4, 0), x_dir=(1, 0, 0), z_dir=(0, 1, 0)), mode=Mode.PRIVATE) as cut_extrude2_sk5:
        with BuildLine():
            Line((6.294591812, 20.009450615), (9.297728295, 29.555917319))
            ThreePointArc((9.297728295, 29.555917319), (9.22295101, 30.33257147), (8.612970493, 30.81909699))
            ThreePointArc((8.612970493, 30.81909699), (1.374941712, 31.970447843), (-5.935210643, 31.444765457))
            ThreePointArc((-5.935210643, 31.444765457), (-6.584709324, 31.012405912), (-6.725889759, 30.245039378))
            Line((-6.725889759, 30.245039378), (-4.553448892, 20.475988454))
            ThreePointArc((-4.553448892, 20.475988454), (-4.133985694, 19.862346135), (-3.406947089, 19.707681536))
            ThreePointArc((-3.406947089, 19.707681536), (0.85933857, 19.981529902), (5.08636065, 19.342412862))
            ThreePointArc((5.08636065, 19.342412862), (5.823993451, 19.434086857), (6.294591812, 20.009450615))
        make_face()
    cut_extrude2_tool5 = extrude(cut_extrude2_sk5.sketch, amount=-CUT_EXTRUDE2_REACH, mode=Mode.PRIVATE) & part.part
    add(cut_extrude2_tool5.solids().sort_by_distance((1.124173, 4, -26.139518))[0], mode=Mode.SUBTRACT)
    # Sketch3 → Cut-Extrude2 (cut, up to next)
    with BuildSketch(Plane(origin=(0, 4, 0), x_dir=(1, 0, 0), z_dir=(0, 1, 0)), mode=Mode.PRIVATE) as cut_extrude2_sk6:
        with BuildLine():
            Line((18.599766773, 9.697869663), (27.473676287, 14.324702834))
            ThreePointArc((27.473676287, 14.324702834), (27.969978179, 14.926755776), (27.882682314, 15.70210263))
            ThreePointArc((27.882682314, 15.70210263), (23.578751076, 21.634289859), (18.037979194, 26.431634581))
            ThreePointArc((18.037979194, 26.431634581), (17.272989906, 26.585175136), (16.630550183, 26.142394699))
            Line((16.630550183, 26.142394699), (11.258935698, 17.698484877))
            ThreePointArc((11.258935698, 17.698484877), (11.121630324, 16.96796896), (11.526359866, 16.344510646))
            ThreePointArc((11.526359866, 16.344510646), (14.736719422, 13.521431162), (17.273751407, 10.080551193))
            ThreePointArc((17.273751407, 10.080551193), (17.860159866, 9.62378934), (18.599766773, 9.697869663))
        make_face()
    cut_extrude2_tool6 = extrude(cut_extrude2_sk6.sketch, amount=-CUT_EXTRUDE2_REACH, mode=Mode.PRIVATE) & part.part
    add(cut_extrude2_tool6.solids().sort_by_distance((19.278341, 4, -17.68852))[0], mode=Mode.SUBTRACT)
    # Sketch3 → Cut-Extrude2 (cut, up to next)
    with BuildSketch(Plane(origin=(0, 4, 0), x_dir=(1, 0, 0), z_dir=(0, 1, 0)), mode=Mode.PRIVATE) as cut_extrude2_sk7:
        with BuildLine():
            Line((20.009450615, -6.294591812), (29.555917319, -9.297728295))
            ThreePointArc((29.555917319, -9.297728295), (30.33257147, -9.22295101), (30.81909699, -8.612970493))
            ThreePointArc((30.81909699, -8.612970493), (31.970447843, -1.374941712), (31.444765457, 5.935210643))
            ThreePointArc((31.444765457, 5.935210643), (31.012405912, 6.584709324), (30.245039378, 6.725889759))
            Line((30.245039378, 6.725889759), (20.475988454, 4.553448892))
            ThreePointArc((20.475988454, 4.553448892), (19.862346135, 4.133985694), (19.707681536, 3.406947089))
            ThreePointArc((19.707681536, 3.406947089), (19.981529902, -0.85933857), (19.342412862, -5.08636065))
            ThreePointArc((19.342412862, -5.08636065), (19.434086857, -5.823993451), (20.009450615, -6.294591812))
        make_face()
    cut_extrude2_tool7 = extrude(cut_extrude2_sk7.sketch, amount=-CUT_EXTRUDE2_REACH, mode=Mode.PRIVATE) & part.part
    add(cut_extrude2_tool7.solids().sort_by_distance((26.139518, 4, 1.124173))[0], mode=Mode.SUBTRACT)
    # Sketch3 → Cut-Extrude2 (cut, up to next)
    with BuildSketch(Plane(origin=(0, 4, 0), x_dir=(1, 0, 0), z_dir=(0, 1, 0)), mode=Mode.PRIVATE) as cut_extrude2_sk8:
        with BuildLine():
            Line((9.697869663, -18.599766773), (14.324702834, -27.473676287))
            ThreePointArc((14.324702834, -27.473676287), (14.926755776, -27.969978179), (15.70210263, -27.882682314))
            ThreePointArc((15.70210263, -27.882682314), (21.634289859, -23.578751076), (26.431634581, -18.037979194))
            ThreePointArc((26.431634581, -18.037979194), (26.585175136, -17.272989906), (26.142394699, -16.630550183))
            Line((26.142394699, -16.630550183), (17.698484877, -11.258935698))
            ThreePointArc((17.698484877, -11.258935698), (16.96796896, -11.121630324), (16.344510646, -11.526359866))
            ThreePointArc((16.344510646, -11.526359866), (13.521431162, -14.736719422), (10.080551193, -17.273751407))
            ThreePointArc((10.080551193, -17.273751407), (9.62378934, -17.860159866), (9.697869663, -18.599766773))
        make_face()
    cut_extrude2_tool8 = extrude(cut_extrude2_sk8.sketch, amount=-CUT_EXTRUDE2_REACH, mode=Mode.PRIVATE) & part.part
    add(cut_extrude2_tool8.solids().sort_by_distance((17.68852, 4, 19.278341))[0], mode=Mode.SUBTRACT)


solid = part.part
